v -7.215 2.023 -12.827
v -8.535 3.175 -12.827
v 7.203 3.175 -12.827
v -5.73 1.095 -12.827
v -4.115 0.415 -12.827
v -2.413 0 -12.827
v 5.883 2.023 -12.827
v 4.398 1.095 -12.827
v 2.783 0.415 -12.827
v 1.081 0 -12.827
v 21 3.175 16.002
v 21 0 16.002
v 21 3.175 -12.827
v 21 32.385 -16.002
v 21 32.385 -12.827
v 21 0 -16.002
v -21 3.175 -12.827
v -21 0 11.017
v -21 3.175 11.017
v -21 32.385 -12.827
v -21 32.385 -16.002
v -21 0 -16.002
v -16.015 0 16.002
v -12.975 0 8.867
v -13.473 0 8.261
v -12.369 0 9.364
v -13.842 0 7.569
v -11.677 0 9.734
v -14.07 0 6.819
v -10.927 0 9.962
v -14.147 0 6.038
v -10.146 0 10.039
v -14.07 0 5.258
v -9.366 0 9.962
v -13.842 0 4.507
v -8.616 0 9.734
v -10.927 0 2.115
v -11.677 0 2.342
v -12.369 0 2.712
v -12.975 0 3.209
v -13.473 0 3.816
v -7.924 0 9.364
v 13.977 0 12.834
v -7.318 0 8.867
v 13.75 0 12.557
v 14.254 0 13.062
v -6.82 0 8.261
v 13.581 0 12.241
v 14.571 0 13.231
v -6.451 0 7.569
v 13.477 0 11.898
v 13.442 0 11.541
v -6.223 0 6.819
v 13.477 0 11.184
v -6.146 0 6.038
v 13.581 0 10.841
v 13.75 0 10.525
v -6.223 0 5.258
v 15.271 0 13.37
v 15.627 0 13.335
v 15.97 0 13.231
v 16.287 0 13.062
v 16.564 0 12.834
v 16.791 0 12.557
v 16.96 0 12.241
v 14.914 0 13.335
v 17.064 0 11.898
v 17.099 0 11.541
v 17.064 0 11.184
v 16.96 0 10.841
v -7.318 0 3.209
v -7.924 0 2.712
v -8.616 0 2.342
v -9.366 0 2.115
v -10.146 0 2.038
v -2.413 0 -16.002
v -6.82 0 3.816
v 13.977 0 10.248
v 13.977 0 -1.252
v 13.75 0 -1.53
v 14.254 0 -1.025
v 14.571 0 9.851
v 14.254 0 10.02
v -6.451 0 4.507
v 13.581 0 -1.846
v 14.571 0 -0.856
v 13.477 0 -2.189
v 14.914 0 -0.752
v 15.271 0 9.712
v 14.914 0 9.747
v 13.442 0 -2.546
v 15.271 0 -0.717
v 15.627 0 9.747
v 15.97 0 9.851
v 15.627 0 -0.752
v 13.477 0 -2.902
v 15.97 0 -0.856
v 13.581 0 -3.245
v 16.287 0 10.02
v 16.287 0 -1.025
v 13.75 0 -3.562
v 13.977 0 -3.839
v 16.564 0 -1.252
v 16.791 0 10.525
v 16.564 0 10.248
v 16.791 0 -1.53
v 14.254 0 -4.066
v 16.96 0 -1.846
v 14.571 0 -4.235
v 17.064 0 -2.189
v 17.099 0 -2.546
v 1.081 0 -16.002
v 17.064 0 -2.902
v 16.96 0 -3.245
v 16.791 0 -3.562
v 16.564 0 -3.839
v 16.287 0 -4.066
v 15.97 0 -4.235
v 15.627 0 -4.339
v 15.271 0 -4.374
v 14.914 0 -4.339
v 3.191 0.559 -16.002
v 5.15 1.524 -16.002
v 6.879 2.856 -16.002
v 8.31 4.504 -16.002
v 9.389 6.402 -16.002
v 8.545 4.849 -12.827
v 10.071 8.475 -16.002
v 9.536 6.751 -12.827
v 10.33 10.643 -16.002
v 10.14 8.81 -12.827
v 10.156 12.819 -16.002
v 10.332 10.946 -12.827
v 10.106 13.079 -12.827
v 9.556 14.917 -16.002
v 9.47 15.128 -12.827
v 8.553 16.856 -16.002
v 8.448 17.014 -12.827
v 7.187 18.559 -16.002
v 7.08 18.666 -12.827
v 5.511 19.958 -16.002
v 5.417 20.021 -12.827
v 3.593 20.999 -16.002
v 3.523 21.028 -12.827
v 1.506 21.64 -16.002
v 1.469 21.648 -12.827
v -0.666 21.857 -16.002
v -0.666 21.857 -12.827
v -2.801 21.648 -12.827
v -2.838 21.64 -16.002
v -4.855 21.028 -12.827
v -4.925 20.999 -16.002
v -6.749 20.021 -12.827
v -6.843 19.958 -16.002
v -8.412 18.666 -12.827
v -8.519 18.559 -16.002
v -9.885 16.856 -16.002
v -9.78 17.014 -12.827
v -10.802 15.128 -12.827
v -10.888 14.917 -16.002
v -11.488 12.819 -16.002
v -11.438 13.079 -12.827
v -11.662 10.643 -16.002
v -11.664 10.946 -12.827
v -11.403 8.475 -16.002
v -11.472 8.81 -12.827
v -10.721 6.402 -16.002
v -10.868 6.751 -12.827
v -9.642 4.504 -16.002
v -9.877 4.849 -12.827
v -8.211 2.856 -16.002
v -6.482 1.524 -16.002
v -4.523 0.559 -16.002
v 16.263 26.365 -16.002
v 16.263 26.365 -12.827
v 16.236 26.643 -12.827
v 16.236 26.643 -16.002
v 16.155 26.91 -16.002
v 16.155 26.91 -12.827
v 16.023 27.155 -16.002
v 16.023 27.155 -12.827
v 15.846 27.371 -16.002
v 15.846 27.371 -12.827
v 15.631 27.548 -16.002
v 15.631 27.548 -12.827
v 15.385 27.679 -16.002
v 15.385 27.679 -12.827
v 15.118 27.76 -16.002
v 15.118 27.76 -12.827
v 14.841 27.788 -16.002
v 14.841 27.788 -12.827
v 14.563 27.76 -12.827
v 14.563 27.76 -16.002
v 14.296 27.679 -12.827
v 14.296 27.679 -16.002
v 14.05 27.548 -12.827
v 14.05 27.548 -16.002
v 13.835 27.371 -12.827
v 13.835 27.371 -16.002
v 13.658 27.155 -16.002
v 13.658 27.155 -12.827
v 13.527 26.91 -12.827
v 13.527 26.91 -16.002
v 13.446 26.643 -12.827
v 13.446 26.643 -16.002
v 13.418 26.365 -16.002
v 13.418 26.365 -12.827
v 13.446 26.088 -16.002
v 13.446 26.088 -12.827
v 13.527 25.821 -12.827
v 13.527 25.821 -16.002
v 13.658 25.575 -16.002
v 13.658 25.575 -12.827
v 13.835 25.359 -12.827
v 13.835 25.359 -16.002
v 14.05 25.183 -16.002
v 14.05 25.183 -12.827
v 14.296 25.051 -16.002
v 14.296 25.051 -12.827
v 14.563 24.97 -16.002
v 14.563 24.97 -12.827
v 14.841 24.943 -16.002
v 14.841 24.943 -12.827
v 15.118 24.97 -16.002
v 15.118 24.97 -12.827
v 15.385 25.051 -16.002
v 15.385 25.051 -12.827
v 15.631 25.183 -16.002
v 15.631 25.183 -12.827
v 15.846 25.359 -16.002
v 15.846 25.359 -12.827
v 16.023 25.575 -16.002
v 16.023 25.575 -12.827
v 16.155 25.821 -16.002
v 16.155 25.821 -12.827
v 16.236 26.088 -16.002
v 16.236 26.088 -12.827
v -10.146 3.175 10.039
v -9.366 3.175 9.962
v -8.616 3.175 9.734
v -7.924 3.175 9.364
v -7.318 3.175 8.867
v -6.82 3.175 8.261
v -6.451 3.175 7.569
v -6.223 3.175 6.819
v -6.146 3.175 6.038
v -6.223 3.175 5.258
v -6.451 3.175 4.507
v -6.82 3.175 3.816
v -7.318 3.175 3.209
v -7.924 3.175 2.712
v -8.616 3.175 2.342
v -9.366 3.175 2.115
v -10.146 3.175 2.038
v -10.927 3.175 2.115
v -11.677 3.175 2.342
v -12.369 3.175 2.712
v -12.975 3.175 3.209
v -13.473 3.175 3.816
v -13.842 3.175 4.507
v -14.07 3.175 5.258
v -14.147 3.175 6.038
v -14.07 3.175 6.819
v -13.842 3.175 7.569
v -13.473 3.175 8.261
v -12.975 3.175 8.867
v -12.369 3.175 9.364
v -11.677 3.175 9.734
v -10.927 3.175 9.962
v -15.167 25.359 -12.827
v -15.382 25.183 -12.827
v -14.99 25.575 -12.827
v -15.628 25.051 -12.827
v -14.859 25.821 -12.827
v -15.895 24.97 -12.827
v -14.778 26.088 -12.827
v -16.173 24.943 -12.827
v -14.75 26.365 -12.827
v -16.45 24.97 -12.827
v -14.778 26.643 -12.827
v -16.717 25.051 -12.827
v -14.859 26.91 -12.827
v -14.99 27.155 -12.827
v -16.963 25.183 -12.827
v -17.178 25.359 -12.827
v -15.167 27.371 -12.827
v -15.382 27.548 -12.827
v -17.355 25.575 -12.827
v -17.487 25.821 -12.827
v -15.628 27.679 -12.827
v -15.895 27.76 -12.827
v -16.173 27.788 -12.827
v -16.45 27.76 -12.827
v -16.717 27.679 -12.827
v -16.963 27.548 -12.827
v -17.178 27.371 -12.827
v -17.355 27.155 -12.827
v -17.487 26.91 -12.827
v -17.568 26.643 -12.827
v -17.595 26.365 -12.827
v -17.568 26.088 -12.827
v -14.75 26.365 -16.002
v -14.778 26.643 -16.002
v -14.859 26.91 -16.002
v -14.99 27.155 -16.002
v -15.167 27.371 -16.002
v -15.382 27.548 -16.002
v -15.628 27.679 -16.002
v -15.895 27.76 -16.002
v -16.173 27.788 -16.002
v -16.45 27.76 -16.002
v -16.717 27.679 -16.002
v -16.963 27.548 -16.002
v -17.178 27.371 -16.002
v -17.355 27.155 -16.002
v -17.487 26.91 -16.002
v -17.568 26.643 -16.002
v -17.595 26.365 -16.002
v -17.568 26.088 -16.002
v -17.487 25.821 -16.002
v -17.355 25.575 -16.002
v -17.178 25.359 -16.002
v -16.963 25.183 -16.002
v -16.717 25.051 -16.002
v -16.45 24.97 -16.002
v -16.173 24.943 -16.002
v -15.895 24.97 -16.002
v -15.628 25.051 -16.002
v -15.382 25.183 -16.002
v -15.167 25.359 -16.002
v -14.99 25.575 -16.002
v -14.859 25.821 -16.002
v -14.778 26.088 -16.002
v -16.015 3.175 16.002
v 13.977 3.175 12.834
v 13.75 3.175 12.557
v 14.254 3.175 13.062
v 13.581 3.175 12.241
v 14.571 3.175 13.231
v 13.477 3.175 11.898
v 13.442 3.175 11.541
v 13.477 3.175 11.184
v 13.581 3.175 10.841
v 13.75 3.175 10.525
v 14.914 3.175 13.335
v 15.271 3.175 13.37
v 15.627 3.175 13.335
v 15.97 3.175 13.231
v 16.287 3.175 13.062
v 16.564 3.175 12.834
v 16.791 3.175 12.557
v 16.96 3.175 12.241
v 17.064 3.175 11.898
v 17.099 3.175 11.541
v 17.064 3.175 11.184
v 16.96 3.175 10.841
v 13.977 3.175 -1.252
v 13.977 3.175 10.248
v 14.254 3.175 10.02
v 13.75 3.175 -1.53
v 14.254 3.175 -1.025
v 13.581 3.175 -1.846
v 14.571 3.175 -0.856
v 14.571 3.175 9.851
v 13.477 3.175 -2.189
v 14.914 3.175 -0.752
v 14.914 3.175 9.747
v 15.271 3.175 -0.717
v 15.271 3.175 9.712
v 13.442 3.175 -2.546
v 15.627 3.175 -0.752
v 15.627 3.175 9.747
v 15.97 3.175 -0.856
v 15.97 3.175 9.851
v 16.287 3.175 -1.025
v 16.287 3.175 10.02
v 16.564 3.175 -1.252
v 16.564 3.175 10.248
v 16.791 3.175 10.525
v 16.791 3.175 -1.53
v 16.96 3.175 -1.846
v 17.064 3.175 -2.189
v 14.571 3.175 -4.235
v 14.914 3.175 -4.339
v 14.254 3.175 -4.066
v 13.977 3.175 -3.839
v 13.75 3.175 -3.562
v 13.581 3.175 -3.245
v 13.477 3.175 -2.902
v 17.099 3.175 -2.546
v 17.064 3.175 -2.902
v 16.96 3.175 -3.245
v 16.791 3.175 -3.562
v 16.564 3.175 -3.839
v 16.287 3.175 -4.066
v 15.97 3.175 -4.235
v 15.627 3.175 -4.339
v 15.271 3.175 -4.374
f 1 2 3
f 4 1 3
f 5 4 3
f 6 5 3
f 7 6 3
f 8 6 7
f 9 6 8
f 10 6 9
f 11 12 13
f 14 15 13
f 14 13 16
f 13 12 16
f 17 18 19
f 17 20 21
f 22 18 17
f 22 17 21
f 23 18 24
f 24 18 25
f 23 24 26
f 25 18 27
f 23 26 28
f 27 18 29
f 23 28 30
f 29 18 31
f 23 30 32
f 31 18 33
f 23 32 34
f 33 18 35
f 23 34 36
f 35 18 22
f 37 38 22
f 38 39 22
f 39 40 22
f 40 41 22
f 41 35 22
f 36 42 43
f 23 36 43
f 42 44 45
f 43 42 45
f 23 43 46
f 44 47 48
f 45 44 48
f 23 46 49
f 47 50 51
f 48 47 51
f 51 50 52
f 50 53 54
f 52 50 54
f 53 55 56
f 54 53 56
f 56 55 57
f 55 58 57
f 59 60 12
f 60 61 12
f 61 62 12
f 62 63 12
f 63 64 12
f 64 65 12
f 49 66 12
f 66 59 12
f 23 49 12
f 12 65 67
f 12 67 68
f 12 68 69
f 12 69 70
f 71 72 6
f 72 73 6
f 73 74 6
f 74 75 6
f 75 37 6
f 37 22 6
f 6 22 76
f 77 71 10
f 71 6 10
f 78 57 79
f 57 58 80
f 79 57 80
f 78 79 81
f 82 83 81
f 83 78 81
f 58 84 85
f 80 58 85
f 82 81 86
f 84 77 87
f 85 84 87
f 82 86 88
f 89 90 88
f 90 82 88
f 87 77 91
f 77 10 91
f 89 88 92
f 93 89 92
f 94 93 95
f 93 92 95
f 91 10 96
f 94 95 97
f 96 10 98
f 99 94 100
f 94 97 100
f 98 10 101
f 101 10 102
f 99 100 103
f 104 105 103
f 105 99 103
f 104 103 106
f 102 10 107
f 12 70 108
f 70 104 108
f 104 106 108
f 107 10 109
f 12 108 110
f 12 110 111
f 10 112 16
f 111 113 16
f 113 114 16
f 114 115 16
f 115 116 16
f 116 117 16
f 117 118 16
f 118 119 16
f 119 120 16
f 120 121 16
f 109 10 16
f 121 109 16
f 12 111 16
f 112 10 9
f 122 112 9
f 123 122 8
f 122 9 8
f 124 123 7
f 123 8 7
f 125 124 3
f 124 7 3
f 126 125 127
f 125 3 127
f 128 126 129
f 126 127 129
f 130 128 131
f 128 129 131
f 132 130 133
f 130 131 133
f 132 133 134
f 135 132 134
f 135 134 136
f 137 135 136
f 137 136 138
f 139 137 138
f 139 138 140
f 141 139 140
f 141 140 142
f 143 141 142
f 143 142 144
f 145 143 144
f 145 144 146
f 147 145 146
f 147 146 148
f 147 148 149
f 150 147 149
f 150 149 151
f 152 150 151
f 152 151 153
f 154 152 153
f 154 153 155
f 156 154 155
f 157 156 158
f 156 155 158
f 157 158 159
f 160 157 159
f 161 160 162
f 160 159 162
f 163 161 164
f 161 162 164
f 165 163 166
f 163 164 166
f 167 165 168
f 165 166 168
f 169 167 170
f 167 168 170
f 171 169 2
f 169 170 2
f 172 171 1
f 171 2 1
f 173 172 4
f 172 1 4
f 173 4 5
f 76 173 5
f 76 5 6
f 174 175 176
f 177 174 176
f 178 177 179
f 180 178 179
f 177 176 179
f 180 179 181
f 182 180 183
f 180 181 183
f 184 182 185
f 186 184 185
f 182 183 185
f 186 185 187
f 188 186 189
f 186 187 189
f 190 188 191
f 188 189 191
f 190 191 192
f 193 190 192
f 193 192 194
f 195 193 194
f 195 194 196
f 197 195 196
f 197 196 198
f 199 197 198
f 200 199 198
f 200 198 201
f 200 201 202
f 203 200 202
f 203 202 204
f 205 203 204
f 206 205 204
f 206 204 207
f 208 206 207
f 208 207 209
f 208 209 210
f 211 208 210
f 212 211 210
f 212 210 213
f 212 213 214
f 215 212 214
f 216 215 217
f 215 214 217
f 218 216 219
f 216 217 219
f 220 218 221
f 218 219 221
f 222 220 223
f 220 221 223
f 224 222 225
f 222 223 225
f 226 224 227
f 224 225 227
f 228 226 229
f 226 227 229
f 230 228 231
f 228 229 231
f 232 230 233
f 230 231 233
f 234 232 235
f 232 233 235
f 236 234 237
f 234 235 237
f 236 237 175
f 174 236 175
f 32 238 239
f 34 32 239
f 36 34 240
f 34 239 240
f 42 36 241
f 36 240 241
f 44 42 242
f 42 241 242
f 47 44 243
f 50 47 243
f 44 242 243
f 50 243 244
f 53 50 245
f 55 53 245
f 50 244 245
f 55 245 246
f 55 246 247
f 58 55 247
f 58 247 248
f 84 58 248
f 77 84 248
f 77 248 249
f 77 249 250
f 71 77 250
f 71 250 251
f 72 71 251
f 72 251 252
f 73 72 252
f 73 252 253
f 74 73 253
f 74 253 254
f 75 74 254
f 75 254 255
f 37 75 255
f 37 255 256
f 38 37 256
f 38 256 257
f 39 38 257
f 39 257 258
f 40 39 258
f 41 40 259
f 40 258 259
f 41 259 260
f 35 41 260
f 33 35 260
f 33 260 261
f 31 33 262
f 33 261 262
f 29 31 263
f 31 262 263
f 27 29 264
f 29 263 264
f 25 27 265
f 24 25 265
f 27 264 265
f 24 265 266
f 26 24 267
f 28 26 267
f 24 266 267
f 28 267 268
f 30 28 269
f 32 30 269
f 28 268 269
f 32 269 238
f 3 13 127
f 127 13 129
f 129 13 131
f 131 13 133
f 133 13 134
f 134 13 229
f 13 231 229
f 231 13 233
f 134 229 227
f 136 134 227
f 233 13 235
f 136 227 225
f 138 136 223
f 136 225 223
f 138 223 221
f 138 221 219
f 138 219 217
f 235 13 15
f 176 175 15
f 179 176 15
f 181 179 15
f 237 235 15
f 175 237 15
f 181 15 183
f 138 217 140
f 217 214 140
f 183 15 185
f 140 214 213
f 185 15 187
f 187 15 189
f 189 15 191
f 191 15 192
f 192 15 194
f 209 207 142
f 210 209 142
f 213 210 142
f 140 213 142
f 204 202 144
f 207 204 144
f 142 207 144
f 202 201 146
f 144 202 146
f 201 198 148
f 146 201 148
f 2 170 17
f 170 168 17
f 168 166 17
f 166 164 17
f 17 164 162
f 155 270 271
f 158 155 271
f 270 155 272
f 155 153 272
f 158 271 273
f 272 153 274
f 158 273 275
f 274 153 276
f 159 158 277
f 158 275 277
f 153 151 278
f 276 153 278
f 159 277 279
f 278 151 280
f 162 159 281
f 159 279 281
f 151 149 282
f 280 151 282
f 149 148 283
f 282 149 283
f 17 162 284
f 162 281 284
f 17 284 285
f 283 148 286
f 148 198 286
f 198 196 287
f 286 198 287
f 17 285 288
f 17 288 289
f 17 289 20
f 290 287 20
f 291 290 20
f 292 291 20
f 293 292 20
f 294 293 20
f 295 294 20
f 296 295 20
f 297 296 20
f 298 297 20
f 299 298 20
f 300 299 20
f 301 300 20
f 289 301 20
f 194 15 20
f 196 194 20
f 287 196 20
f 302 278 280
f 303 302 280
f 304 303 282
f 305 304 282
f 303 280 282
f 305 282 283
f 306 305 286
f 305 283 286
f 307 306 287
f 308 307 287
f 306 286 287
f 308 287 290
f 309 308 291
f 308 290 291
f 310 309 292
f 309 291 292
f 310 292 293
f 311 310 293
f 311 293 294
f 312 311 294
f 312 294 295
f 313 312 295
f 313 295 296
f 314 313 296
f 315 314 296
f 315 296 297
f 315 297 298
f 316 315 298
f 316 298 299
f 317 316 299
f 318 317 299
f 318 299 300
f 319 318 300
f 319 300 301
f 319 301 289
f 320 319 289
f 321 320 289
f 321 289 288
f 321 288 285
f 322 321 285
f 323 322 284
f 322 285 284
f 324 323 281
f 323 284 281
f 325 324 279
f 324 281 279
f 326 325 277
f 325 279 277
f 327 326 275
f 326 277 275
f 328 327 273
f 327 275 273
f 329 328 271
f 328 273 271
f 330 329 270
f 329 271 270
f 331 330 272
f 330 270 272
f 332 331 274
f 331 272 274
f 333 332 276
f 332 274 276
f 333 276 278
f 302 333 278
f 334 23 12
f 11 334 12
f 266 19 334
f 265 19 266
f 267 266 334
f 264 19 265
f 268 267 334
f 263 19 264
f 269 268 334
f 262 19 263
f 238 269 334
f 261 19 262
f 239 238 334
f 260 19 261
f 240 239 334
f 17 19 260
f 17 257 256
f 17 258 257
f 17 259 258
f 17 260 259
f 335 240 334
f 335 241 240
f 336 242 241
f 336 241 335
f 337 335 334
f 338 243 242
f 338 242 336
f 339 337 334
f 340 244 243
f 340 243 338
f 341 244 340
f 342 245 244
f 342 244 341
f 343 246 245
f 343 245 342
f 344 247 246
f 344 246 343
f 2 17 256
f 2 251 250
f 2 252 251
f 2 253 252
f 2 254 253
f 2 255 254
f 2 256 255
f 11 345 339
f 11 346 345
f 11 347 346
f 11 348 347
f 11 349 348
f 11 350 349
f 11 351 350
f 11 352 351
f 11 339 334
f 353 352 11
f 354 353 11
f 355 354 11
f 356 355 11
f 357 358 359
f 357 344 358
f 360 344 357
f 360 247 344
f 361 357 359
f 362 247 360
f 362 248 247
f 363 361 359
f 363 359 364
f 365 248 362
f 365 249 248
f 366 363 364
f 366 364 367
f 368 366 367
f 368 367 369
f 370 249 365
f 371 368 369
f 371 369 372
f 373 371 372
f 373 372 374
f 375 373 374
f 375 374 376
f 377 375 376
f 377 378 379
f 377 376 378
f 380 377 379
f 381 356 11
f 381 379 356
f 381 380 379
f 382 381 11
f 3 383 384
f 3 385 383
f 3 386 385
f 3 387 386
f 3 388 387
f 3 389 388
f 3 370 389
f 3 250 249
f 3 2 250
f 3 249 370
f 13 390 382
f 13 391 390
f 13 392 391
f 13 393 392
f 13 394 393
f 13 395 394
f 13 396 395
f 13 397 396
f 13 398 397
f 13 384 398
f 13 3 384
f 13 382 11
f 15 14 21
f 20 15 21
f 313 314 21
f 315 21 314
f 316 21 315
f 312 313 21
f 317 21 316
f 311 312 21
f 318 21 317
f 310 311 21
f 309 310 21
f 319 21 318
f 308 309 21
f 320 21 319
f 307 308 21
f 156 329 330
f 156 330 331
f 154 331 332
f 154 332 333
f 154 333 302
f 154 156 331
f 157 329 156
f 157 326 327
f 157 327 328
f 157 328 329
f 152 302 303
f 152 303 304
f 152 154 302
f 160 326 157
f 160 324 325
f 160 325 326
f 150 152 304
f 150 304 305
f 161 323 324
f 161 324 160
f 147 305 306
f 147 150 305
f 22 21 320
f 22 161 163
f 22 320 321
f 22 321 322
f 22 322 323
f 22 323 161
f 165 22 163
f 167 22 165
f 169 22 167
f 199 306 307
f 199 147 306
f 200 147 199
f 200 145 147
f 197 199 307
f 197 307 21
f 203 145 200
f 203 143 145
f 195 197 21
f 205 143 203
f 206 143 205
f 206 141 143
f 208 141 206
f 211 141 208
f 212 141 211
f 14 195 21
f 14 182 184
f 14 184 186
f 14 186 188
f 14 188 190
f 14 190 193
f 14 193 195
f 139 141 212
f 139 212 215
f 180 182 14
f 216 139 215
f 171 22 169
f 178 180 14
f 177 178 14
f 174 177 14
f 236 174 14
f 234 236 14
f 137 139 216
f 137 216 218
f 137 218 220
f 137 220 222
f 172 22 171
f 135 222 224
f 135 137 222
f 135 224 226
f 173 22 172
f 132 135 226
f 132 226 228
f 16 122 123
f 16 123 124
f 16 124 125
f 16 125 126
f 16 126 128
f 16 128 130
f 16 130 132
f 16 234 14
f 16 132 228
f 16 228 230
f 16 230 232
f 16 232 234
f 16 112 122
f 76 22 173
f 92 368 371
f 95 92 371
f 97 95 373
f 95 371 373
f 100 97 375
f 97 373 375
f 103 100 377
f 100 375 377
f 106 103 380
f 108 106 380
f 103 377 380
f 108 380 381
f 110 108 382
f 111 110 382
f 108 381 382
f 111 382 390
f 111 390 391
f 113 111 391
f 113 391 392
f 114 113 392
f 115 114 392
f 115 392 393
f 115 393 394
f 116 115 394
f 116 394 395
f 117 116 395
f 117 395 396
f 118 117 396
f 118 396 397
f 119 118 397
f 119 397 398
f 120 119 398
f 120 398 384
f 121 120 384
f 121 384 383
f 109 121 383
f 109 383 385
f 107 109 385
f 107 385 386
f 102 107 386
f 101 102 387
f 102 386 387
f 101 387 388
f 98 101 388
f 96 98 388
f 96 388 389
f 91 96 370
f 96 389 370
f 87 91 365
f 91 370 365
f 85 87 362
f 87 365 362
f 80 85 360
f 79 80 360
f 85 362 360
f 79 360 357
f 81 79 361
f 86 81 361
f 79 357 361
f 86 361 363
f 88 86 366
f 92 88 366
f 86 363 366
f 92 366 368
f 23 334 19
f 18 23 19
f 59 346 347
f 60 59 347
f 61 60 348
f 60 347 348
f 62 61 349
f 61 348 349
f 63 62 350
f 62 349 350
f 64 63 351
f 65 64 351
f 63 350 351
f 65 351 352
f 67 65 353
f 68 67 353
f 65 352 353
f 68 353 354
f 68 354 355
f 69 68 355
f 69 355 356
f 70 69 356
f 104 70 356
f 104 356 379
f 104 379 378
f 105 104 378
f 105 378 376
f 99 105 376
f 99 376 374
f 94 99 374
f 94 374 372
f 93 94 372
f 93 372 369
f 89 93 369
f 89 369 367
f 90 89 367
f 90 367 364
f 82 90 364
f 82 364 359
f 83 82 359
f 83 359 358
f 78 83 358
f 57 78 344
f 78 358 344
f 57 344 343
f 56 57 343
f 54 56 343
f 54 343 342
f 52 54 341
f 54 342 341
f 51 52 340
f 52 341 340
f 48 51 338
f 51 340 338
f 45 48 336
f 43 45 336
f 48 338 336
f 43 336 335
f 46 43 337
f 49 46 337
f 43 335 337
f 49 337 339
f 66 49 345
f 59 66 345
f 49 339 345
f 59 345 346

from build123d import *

# Parameters (mm, degrees)
SKETCH1_W           = 42
SKETCH1_H           = 32.004
BOSS_EXTRUDE1_DEPTH = 3.175
SKETCH2_W           = 42
SKETCH2_H           = 32.385
BOSS_EXTRUDE2_DEPTH = 3.175
SKETCH3_R           = 10.9982
SKETCH3_R_2         = 1.4224
CUT_EXTRUDE1_DEPTH  = 5.08
SKETCH4_R           = 4.0005
SKETCH4_R_2         = 1.8288
CUT_EXTRUDE2_DEPTH  = 5.1054
CUT_EXTRUDE3_DEPTH  = 40.373698125


with BuildPart() as part:
    # Sketch1 → Boss-Extrude1 (new body)
    with BuildSketch(Plane(origin=(0, 0, 0), x_dir=(1, 0, 0), z_dir=(0, 1, 0))):
        Rectangle(SKETCH1_W, SKETCH1_H)
    extrude(amount=BOSS_EXTRUDE1_DEPTH)

    # Sketch2 → Boss-Extrude2 (add)
    with BuildSketch(Plane(origin=(0, 0, -16.002), x_dir=(-1, 0, 0), z_dir=(0, 0, -1))):
        with Locations((0, 16.1925)):
            Rectangle(SKETCH2_W, SKETCH2_H)
    extrude(amount=-BOSS_EXTRUDE2_DEPTH)

    # Sketch3 → Cut-Extrude1 (cut)
    with BuildSketch(Plane.XY.offset(-12.827)):
        with Locations((-0.665996173, 10.8585)):
            Circle(SKETCH3_R)
        with Locations((-16.172696173, 26.3652)):
            Circle(SKETCH3_R_2)
        with Locations((14.840703827, 26.3652)):
            Circle(SKETCH3_R_2)
    extrude(amount=-CUT_EXTRUDE1_DEPTH, mode=Mode.SUBTRACT)

    # Sketch4 → Cut-Extrude2 (cut)
    with BuildSketch(Plane(origin=(0, 3.175, 0), x_dir=(1, 0, 0), z_dir=(0, 1, 0))):
        with Locations(Location((-10.14648729, -6.038137545, 0), (0, 0, 270))):
            Circle(SKETCH4_R)
        with Locations(Location((15.27051293, -11.541044372, 0), (0, 0, 270))):
            Circle(SKETCH4_R_2)
        with Locations(Location((15.27051293, 2.545639175, 0), (0, 0, 270))):
            Circle(SKETCH4_R_2)
    extrude(amount=-CUT_EXTRUDE2_DEPTH, mode=Mode.SUBTRACT)

    # Sketch5 → Cut-Extrude3 (cut, through all)
    with BuildSketch(Plane(origin=(0, 3.175, 0), x_dir=(1, 0, 0), z_dir=(0, 1, 0))):
        Polygon((-16.015261935, -16.002), (-21, -11.017261935), (-21, -16.002), align=None)
    extrude(amount=-CUT_EXTRUDE3_DEPTH, mode=Mode.SUBTRACT)


solid = part.part
